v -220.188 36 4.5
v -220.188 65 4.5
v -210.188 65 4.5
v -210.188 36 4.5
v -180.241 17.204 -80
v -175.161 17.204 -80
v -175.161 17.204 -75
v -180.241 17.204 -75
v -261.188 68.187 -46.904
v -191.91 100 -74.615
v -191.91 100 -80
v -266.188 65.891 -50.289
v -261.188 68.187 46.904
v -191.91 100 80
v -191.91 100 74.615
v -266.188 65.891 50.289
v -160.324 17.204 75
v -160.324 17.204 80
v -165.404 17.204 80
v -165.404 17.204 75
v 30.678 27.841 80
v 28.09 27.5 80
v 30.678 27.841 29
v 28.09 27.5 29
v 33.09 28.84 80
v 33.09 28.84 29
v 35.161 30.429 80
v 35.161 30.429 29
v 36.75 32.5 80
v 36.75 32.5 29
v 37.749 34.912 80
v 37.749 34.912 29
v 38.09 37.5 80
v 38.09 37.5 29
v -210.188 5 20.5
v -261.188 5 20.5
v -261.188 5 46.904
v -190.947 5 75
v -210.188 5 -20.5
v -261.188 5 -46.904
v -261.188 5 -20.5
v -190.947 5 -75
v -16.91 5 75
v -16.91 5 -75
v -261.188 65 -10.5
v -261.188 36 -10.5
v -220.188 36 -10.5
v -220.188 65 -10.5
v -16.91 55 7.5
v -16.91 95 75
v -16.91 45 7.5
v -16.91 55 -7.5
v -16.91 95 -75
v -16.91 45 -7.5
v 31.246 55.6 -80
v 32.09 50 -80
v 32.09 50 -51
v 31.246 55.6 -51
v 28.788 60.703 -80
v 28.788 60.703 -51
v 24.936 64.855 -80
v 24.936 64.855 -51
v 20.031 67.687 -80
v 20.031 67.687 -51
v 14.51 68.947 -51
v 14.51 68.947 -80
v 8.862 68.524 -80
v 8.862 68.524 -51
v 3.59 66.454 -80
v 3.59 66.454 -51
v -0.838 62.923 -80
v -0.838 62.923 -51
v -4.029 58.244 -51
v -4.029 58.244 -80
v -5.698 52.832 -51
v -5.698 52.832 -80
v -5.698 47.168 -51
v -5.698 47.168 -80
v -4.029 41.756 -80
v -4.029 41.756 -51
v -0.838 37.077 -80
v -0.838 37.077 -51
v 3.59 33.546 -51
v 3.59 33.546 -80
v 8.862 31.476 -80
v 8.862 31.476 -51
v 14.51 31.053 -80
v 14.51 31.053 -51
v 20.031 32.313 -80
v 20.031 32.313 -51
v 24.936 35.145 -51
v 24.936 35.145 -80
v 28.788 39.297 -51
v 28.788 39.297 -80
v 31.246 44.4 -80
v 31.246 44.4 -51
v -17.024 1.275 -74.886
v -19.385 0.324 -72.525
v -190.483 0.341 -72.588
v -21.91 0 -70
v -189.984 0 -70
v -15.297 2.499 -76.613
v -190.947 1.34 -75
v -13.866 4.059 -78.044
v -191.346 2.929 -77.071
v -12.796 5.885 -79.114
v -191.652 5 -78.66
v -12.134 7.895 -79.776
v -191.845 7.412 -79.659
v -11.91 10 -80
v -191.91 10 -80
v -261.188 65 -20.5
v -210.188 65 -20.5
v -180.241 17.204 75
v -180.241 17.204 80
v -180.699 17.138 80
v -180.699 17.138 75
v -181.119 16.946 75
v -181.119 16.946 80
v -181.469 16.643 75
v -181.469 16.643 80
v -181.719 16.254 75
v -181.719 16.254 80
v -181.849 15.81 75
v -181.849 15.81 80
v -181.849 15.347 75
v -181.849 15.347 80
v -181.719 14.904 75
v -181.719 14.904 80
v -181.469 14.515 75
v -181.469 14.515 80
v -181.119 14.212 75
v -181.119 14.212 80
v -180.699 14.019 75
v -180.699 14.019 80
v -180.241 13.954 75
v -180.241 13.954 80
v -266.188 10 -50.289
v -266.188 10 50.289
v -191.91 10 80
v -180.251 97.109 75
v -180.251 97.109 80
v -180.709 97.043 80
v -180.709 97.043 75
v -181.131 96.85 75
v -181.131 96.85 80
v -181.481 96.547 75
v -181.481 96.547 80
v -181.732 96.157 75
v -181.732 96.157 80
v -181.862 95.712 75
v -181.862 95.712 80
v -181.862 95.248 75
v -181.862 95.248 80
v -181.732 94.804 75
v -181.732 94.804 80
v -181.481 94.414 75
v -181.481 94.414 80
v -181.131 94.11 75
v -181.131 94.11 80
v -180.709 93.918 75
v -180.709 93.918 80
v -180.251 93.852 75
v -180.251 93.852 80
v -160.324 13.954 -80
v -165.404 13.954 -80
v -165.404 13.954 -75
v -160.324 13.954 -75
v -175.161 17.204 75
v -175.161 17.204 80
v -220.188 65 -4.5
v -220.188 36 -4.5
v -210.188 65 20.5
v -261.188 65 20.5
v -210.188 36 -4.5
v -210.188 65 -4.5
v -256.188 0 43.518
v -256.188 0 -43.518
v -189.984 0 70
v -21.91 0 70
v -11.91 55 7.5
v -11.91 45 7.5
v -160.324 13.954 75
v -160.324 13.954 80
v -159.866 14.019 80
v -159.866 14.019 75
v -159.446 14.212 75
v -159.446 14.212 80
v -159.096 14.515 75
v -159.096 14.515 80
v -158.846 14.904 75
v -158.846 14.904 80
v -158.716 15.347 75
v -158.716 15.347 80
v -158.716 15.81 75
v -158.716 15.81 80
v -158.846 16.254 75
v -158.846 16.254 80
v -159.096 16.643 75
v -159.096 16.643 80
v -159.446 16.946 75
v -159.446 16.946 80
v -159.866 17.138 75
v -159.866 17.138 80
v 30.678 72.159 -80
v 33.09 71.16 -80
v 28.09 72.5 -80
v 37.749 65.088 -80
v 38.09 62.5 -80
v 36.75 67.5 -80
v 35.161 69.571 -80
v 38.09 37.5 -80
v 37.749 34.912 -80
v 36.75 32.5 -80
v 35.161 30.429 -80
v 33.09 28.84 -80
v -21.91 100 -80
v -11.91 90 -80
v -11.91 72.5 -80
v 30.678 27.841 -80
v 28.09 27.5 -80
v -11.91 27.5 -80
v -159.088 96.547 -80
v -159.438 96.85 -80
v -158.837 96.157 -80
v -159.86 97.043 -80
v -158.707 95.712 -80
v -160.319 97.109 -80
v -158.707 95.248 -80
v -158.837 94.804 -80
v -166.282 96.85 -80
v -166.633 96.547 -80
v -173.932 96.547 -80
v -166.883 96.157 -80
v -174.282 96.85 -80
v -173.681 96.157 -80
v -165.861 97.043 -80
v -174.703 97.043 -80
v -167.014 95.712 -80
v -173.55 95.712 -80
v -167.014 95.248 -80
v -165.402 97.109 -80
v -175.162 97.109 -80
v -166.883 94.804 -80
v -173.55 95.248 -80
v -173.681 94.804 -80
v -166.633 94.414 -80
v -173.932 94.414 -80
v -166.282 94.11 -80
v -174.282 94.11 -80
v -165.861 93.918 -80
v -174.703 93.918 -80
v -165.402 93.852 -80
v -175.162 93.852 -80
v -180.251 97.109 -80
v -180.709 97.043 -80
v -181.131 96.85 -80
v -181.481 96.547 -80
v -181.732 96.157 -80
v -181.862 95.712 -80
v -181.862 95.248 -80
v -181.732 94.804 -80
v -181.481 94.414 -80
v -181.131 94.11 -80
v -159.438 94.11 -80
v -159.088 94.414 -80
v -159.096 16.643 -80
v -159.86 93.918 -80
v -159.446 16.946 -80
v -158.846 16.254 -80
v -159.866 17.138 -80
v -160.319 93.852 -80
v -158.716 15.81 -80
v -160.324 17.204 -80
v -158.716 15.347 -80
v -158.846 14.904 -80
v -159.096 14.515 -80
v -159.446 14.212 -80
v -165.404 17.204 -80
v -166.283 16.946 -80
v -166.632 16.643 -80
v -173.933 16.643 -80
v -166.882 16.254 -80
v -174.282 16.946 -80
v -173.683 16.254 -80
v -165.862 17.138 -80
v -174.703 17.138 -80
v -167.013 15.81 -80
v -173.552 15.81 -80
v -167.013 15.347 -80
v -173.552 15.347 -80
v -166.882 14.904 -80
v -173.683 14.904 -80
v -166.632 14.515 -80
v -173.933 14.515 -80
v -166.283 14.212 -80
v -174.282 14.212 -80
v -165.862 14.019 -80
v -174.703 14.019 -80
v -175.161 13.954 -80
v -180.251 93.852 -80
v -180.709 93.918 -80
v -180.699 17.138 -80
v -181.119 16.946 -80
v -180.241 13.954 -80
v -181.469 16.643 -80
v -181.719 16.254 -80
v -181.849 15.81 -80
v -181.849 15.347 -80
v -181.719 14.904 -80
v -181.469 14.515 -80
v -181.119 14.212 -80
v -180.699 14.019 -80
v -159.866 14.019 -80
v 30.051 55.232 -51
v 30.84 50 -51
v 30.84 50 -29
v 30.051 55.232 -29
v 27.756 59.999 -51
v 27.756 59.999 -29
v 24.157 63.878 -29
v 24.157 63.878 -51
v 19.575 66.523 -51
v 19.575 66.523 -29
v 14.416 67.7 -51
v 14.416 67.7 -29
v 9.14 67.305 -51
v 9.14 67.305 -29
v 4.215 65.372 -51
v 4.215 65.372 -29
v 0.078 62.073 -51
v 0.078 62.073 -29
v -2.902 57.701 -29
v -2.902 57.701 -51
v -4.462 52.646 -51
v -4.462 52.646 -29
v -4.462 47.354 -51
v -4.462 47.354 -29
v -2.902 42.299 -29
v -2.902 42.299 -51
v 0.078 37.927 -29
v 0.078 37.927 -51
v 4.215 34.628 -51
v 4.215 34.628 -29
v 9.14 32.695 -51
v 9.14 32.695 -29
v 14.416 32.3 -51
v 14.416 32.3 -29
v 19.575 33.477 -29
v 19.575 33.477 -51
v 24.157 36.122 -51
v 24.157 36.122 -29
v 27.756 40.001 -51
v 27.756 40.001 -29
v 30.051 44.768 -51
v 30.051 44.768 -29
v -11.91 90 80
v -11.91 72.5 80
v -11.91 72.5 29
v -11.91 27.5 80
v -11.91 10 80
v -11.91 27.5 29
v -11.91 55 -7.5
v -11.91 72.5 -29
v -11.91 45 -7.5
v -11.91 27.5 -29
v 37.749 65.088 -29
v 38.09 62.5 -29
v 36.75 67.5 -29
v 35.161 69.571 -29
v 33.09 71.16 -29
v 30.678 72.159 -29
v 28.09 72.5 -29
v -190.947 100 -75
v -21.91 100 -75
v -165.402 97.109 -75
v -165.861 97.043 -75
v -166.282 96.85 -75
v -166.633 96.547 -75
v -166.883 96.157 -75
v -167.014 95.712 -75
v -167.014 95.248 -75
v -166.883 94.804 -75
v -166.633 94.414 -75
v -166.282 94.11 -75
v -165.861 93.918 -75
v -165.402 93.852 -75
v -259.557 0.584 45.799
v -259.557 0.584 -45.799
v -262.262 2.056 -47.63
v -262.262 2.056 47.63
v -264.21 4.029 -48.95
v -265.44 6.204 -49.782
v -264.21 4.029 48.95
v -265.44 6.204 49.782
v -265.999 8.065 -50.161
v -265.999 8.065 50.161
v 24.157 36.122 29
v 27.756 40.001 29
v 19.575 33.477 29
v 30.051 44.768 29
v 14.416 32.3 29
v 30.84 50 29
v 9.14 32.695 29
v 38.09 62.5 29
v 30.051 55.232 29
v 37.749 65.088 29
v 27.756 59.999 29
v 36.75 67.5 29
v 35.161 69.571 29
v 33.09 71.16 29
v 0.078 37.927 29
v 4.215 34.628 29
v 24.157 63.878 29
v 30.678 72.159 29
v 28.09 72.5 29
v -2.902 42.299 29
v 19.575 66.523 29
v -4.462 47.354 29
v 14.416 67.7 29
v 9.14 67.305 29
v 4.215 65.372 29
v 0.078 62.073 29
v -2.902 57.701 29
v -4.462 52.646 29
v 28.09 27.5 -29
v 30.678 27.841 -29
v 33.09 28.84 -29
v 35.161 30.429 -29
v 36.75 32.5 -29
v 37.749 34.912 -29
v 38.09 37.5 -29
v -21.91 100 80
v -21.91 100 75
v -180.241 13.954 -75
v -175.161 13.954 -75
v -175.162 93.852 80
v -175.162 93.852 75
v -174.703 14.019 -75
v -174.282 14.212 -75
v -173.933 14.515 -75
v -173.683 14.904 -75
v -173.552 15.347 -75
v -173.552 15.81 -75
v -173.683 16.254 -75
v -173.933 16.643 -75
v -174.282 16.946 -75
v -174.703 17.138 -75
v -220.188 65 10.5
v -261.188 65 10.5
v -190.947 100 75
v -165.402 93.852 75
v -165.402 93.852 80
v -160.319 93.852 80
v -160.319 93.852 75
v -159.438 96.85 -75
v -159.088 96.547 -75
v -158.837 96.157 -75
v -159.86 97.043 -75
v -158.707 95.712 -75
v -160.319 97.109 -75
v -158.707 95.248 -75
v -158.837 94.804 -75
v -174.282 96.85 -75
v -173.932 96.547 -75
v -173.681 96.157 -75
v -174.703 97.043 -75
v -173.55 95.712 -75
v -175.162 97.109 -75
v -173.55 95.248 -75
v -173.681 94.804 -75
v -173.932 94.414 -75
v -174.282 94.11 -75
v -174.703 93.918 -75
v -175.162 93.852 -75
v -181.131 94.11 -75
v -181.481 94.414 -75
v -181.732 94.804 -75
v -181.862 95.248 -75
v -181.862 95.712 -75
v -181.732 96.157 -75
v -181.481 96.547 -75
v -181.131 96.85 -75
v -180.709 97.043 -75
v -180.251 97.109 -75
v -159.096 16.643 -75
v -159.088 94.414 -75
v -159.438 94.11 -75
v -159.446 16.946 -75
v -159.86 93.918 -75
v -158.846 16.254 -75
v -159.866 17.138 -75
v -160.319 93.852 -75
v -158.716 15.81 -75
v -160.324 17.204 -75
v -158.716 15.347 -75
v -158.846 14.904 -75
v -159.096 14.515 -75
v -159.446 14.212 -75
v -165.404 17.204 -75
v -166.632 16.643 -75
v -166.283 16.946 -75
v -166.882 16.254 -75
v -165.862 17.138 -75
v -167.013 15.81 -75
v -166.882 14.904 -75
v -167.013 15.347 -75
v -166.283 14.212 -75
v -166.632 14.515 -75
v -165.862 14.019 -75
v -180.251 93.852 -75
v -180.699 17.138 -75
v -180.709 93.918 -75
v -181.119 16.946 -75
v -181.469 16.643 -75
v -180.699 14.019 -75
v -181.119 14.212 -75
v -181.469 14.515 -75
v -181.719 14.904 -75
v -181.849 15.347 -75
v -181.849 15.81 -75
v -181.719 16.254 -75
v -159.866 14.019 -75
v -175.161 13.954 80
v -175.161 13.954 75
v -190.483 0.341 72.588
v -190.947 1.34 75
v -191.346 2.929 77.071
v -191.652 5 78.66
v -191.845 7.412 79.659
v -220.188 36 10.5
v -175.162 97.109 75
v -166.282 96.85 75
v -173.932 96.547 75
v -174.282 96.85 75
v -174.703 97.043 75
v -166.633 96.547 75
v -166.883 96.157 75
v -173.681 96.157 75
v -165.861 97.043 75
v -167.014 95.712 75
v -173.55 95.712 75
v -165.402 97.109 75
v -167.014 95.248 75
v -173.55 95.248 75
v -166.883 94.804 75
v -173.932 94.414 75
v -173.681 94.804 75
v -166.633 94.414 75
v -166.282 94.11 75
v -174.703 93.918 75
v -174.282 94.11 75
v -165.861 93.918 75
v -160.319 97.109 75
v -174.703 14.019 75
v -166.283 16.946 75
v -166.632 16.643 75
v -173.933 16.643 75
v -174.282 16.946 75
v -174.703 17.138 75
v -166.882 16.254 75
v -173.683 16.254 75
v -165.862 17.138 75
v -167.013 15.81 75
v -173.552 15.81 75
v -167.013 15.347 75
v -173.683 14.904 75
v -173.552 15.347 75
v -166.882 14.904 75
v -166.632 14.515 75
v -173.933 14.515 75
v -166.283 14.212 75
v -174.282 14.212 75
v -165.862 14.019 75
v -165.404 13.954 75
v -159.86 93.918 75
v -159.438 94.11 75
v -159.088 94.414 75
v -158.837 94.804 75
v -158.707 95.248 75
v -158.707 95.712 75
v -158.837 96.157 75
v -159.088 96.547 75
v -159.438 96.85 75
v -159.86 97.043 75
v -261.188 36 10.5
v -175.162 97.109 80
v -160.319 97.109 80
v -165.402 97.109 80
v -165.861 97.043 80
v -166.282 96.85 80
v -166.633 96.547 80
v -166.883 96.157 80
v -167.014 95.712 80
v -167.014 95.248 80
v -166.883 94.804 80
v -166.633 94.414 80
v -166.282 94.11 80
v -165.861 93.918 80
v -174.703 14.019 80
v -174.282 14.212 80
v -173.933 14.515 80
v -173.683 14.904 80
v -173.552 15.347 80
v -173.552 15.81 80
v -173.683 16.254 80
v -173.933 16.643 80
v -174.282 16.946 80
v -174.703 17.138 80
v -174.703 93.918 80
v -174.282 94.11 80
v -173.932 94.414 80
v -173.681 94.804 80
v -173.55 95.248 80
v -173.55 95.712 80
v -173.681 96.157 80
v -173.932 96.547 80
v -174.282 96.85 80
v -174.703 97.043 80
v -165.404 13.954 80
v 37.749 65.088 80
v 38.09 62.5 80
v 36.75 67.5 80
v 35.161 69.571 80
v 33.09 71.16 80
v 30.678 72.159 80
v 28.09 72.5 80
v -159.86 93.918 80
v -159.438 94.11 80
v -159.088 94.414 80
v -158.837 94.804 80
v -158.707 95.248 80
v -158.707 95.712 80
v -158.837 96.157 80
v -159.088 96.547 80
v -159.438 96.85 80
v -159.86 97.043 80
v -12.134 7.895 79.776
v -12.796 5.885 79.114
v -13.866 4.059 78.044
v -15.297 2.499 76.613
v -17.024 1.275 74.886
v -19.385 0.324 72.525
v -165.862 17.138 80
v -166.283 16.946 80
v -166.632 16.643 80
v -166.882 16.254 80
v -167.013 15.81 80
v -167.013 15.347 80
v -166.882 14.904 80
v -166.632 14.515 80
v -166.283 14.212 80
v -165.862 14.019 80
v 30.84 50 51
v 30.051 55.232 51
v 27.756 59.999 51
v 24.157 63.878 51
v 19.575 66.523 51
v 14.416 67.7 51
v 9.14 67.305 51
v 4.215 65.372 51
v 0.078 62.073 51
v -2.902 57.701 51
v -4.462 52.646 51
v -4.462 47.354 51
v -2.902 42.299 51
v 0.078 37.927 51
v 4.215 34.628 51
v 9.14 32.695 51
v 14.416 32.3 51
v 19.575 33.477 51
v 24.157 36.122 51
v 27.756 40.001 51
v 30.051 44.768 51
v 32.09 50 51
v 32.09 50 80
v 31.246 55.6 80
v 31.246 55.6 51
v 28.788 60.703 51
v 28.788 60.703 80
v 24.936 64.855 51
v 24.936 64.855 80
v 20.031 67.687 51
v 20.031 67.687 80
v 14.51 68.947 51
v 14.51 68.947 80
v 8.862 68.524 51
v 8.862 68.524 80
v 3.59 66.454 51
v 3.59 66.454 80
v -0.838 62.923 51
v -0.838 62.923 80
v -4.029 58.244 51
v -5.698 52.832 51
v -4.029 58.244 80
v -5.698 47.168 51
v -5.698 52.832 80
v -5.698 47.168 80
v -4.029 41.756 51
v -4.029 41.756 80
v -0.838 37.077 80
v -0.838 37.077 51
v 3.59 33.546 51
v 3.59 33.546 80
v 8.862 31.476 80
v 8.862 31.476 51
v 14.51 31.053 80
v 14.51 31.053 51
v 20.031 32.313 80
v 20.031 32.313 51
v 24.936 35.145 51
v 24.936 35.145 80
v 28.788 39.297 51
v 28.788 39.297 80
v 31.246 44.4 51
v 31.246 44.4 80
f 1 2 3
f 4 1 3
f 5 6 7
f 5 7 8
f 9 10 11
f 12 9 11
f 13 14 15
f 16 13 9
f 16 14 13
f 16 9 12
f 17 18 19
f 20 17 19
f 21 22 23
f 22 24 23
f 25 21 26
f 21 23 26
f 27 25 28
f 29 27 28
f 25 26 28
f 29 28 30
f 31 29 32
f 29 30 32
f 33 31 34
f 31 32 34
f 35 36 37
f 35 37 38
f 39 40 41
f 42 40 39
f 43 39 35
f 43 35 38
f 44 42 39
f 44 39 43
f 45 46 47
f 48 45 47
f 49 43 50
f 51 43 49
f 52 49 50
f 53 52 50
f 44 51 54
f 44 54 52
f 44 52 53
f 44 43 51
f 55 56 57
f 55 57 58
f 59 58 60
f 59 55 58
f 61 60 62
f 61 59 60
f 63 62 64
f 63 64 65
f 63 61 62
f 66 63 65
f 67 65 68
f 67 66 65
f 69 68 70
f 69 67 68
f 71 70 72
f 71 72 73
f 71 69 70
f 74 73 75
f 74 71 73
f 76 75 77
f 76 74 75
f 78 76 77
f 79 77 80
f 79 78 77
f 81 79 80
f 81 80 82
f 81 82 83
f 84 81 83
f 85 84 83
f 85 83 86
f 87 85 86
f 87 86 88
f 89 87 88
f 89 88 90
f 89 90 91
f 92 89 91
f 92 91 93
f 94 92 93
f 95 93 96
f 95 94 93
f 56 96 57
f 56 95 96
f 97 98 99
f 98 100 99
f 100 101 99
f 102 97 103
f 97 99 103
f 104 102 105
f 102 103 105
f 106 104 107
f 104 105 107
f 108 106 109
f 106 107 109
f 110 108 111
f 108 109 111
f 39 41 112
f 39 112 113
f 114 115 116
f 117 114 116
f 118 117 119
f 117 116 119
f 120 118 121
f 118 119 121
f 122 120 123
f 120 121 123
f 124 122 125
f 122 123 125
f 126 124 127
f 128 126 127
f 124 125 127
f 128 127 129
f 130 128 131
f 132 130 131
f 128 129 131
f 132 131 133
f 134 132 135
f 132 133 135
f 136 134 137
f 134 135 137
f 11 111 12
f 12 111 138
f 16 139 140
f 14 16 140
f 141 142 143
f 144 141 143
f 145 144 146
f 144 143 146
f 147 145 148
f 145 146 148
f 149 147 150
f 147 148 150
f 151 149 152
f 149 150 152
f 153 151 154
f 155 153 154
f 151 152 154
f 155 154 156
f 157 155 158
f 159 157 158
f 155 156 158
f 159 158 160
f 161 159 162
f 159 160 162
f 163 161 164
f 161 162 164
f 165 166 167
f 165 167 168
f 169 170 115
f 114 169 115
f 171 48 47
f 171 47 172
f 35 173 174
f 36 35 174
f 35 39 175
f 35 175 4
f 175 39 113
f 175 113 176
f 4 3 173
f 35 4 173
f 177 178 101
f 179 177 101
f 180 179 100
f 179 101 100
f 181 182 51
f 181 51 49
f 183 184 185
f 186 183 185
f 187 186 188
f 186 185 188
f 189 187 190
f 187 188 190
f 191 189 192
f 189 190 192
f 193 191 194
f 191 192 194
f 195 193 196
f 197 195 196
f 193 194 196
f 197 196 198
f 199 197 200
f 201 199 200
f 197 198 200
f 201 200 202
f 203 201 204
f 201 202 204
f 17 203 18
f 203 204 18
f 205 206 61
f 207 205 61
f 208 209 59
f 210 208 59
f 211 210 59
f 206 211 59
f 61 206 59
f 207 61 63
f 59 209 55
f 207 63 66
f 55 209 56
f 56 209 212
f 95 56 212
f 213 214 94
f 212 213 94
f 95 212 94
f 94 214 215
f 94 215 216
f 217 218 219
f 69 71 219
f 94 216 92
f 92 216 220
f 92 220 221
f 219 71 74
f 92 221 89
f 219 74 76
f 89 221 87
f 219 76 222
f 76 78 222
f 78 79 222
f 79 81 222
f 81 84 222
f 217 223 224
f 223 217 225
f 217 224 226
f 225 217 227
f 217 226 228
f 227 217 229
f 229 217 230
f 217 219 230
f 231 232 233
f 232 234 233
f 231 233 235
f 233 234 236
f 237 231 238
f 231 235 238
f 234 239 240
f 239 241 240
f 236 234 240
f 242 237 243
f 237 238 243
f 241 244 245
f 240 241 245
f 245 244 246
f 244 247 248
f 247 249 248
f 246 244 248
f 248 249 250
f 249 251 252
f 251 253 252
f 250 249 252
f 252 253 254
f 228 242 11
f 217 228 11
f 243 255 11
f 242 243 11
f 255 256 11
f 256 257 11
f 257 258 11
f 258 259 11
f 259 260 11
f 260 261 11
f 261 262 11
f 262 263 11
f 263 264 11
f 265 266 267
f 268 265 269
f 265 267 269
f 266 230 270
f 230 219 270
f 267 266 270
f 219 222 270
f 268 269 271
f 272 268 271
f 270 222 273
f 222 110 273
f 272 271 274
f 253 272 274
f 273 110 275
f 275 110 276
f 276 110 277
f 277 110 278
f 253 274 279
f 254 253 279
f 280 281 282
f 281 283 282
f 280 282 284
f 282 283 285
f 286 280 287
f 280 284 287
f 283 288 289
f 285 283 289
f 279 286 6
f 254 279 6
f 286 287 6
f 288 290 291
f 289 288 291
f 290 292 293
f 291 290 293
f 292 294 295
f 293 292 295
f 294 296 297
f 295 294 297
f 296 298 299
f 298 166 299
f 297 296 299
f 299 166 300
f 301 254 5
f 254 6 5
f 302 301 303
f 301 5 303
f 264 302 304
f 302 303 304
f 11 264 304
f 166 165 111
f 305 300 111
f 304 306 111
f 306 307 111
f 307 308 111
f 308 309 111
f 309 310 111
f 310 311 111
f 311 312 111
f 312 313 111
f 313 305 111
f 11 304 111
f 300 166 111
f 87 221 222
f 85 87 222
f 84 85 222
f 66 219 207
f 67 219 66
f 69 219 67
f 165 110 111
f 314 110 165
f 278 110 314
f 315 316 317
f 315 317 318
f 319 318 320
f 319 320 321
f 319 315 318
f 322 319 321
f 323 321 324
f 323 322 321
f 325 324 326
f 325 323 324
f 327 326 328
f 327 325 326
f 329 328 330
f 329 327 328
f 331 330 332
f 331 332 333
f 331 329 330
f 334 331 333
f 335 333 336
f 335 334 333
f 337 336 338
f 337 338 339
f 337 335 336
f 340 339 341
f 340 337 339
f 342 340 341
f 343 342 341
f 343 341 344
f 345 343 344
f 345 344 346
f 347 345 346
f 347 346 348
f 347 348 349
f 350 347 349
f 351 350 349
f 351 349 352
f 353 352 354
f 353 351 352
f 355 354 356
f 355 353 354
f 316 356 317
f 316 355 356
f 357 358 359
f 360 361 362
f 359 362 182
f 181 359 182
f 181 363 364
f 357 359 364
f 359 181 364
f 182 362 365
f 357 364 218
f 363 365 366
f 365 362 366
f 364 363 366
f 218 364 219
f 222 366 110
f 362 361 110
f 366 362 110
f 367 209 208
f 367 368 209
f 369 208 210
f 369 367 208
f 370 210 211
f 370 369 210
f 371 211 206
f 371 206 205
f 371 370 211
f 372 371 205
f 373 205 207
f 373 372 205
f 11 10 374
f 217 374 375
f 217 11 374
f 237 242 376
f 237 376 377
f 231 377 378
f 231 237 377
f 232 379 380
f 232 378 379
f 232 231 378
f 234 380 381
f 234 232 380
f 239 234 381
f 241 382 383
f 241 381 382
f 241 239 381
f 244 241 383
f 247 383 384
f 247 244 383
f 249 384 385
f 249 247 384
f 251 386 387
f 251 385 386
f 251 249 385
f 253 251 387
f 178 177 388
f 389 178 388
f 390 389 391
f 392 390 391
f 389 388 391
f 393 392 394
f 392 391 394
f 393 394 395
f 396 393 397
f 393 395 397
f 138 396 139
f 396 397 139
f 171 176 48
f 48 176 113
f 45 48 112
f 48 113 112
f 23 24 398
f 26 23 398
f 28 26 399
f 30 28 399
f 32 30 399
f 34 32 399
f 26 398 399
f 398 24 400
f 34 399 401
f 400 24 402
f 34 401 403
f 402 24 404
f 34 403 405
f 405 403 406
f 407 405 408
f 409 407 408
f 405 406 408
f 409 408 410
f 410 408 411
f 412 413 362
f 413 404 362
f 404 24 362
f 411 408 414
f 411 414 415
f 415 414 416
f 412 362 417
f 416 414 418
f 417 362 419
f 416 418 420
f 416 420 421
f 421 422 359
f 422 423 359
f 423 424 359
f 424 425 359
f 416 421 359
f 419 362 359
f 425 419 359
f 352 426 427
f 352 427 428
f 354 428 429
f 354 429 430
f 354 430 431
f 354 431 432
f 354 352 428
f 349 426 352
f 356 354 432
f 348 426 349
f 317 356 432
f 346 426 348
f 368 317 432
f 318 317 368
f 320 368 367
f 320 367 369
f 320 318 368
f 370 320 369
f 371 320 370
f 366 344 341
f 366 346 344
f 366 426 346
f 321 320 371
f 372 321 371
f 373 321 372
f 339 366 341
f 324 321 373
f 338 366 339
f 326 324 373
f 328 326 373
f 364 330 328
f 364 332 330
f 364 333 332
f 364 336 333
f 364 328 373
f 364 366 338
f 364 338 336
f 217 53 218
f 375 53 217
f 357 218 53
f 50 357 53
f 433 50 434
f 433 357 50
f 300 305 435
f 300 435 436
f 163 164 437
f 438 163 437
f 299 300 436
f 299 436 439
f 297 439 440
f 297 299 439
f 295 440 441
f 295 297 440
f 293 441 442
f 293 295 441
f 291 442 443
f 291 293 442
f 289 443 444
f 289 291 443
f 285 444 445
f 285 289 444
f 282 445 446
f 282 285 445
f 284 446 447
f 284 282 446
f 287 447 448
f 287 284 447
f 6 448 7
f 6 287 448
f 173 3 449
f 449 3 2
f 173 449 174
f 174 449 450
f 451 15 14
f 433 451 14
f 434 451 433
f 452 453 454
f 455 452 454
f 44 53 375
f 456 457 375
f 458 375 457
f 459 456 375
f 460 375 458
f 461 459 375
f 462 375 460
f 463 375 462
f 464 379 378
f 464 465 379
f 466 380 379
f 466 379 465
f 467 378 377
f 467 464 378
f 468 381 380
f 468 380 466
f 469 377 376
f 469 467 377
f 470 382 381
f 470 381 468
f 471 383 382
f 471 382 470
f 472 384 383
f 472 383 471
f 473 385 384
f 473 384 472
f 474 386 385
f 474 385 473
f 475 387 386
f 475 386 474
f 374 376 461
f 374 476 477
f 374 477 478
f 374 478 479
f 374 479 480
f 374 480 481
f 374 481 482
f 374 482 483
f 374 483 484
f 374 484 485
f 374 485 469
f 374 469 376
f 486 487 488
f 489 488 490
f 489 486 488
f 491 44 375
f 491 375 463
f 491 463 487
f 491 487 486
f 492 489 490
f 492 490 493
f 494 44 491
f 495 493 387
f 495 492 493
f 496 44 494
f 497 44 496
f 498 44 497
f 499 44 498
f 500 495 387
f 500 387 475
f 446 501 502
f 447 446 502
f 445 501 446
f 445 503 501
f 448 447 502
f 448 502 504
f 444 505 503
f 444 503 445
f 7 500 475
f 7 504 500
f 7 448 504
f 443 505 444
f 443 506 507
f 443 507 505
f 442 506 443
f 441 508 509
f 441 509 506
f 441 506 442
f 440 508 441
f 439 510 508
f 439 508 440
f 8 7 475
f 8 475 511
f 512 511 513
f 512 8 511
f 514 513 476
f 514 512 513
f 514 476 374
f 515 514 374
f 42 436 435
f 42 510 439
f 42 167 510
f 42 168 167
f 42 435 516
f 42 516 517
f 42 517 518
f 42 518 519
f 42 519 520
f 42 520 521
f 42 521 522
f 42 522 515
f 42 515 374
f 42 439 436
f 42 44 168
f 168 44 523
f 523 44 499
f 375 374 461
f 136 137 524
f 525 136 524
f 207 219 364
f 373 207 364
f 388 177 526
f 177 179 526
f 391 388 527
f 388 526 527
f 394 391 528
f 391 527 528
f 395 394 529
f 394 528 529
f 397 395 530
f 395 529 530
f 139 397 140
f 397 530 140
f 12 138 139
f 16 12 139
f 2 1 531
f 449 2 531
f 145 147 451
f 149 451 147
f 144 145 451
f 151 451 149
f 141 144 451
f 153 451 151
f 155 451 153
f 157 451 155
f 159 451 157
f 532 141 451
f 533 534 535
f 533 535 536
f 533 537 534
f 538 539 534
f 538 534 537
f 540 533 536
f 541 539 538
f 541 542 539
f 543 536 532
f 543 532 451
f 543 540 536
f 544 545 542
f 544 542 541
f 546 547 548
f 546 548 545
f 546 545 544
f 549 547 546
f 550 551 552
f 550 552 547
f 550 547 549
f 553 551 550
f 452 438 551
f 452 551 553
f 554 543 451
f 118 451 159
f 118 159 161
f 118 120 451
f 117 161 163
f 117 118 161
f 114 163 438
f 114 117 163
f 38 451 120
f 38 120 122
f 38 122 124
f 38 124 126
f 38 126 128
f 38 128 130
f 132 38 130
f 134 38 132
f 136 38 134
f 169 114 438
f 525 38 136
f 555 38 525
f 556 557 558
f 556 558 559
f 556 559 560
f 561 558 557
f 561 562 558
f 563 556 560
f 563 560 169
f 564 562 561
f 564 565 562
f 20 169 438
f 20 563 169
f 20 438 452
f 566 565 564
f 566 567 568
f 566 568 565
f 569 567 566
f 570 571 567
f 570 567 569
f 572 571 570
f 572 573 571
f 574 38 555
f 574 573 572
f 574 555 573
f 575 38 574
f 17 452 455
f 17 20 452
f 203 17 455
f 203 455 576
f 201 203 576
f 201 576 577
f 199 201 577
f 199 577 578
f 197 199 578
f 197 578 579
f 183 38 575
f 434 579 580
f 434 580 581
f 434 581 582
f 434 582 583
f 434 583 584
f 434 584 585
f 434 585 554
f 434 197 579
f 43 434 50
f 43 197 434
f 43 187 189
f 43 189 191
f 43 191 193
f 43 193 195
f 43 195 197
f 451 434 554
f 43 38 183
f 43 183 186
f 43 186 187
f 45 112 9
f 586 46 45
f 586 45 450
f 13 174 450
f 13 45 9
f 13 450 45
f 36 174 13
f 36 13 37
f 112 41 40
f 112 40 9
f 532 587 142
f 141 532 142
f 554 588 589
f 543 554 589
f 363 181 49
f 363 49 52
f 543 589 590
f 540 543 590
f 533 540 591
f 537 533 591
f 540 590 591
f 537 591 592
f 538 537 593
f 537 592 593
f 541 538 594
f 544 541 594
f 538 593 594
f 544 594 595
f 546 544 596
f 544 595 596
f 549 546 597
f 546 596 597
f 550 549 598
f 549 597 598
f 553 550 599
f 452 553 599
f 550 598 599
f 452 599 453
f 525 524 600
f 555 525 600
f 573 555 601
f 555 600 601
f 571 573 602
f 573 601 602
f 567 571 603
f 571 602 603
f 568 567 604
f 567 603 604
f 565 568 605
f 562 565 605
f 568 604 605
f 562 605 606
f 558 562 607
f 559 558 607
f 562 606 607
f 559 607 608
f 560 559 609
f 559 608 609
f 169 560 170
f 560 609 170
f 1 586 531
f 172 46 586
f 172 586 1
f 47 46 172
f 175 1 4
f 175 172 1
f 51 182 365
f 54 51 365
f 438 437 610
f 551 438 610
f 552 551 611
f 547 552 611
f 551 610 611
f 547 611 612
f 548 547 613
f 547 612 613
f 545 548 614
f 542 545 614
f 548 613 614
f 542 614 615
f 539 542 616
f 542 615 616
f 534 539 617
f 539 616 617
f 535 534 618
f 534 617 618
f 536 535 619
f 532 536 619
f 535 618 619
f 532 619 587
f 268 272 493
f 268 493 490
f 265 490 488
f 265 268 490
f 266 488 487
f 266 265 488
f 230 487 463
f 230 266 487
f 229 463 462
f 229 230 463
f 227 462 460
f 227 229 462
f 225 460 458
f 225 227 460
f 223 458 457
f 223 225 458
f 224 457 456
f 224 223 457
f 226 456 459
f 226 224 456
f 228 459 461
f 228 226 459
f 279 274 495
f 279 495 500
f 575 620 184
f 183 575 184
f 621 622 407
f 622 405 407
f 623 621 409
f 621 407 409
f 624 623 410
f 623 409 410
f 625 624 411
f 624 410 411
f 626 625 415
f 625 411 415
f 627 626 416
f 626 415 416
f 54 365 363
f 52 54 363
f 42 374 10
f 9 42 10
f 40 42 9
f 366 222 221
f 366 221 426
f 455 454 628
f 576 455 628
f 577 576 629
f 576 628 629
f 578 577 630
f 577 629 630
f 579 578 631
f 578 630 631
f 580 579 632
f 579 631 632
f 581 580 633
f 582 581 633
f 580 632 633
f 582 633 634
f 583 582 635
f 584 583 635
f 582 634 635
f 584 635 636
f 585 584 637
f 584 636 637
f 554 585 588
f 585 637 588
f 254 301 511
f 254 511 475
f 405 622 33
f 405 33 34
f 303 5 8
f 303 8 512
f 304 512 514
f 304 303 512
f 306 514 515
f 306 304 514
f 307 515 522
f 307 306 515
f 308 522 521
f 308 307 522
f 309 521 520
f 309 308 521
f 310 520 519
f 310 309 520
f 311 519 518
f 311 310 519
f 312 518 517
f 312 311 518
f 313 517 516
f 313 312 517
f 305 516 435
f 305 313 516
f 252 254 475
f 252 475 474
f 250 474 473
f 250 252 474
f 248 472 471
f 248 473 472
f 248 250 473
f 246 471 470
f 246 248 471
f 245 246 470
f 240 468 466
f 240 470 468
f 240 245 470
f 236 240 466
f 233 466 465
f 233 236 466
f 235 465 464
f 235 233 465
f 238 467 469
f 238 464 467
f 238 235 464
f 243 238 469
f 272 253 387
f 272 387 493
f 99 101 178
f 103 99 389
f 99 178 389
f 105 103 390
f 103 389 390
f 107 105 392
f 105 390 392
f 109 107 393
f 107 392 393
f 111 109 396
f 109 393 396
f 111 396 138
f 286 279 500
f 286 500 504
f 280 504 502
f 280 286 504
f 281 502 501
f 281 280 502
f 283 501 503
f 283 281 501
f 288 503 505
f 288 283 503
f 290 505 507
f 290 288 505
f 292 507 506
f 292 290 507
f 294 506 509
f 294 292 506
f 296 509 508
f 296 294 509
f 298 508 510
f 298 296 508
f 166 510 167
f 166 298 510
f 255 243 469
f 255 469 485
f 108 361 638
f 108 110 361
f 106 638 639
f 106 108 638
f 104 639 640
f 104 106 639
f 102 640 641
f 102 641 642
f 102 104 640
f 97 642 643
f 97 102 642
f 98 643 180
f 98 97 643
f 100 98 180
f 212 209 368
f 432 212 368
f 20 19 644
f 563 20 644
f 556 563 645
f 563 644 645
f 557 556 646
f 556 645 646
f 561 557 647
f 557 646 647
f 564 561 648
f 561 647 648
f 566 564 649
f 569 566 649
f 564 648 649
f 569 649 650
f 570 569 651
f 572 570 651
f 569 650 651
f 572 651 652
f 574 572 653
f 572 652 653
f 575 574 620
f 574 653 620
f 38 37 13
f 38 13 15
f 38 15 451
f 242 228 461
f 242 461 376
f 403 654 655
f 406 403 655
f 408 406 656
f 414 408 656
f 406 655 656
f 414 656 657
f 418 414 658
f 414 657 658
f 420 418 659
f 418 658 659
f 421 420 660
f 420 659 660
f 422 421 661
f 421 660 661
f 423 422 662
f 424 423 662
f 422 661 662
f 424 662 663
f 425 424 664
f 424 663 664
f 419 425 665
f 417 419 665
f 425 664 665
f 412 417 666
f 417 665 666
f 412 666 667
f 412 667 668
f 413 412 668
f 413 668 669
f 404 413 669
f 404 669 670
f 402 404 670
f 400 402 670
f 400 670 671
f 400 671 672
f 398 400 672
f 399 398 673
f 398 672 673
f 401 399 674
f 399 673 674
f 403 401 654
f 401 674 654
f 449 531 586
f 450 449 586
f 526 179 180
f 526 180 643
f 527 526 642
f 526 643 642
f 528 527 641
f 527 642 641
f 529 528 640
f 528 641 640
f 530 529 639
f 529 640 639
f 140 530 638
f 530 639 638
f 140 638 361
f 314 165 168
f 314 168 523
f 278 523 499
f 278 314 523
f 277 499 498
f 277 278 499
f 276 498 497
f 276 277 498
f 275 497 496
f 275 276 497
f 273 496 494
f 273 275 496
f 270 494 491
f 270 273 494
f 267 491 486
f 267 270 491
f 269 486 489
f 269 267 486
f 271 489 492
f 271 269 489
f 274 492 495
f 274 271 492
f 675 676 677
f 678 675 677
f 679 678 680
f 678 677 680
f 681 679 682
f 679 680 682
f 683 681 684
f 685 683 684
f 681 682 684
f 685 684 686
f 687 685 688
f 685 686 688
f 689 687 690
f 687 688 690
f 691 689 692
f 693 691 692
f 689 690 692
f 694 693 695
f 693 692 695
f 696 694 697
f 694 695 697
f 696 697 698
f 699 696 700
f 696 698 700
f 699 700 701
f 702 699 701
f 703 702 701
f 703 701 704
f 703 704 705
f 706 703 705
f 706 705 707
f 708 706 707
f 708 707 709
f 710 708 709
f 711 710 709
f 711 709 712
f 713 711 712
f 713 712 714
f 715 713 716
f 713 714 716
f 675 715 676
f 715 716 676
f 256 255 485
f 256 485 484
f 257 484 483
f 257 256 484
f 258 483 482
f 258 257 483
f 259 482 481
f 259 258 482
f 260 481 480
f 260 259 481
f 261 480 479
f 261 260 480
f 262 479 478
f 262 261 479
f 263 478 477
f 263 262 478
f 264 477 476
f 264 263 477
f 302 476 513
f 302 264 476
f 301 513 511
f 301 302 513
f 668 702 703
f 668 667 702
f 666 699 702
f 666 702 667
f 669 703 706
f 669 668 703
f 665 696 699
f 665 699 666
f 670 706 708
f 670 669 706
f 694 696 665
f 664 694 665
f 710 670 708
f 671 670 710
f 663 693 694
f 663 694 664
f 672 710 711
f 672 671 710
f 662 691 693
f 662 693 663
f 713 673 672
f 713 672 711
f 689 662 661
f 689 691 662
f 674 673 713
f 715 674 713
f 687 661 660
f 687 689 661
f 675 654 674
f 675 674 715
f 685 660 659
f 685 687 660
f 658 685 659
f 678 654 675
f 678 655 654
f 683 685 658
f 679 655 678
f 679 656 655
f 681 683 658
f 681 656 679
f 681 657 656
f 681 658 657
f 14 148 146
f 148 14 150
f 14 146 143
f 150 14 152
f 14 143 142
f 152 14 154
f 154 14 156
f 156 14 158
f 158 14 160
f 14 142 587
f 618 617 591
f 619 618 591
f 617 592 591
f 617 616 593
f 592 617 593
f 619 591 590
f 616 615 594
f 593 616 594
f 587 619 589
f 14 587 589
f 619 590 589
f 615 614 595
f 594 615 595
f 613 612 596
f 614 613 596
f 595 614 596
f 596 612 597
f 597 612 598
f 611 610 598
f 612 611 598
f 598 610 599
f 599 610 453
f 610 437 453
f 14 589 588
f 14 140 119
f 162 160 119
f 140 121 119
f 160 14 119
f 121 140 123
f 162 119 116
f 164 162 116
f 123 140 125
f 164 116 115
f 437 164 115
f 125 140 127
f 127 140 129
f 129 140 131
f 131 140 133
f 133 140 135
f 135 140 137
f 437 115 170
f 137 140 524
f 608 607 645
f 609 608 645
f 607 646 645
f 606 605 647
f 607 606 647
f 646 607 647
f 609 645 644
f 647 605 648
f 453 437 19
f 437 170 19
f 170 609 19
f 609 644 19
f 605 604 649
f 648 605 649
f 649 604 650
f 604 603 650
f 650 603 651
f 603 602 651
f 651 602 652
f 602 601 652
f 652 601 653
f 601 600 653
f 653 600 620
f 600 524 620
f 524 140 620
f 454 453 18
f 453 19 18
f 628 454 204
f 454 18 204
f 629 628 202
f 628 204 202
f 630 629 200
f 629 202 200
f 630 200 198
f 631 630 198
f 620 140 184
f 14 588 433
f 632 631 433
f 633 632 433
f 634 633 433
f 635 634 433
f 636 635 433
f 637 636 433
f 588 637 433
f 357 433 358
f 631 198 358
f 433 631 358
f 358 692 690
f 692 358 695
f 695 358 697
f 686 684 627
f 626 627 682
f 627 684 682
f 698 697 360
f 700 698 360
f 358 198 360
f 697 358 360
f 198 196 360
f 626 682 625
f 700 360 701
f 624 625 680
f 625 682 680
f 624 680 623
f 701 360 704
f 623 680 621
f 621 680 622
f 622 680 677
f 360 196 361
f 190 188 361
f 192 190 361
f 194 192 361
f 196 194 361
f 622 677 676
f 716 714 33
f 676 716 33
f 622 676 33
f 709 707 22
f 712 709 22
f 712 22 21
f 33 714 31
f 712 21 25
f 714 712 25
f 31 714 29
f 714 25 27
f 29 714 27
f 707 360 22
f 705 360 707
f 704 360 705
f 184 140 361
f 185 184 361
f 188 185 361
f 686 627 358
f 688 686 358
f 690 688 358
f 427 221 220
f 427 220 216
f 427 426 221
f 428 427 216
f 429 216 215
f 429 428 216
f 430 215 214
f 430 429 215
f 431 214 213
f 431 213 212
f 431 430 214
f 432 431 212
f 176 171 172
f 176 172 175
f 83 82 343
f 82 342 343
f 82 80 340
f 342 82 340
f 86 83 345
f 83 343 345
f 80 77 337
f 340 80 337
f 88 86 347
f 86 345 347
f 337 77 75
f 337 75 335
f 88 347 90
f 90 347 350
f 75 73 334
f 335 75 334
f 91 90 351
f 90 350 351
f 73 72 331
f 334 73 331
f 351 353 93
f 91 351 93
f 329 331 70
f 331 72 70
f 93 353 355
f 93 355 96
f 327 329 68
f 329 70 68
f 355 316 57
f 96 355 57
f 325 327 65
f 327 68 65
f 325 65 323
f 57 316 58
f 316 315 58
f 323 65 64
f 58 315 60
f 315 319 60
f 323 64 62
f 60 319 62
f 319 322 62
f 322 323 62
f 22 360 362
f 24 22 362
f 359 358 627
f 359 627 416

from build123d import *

# Parameters (mm, degrees)
BOSS_EXTRUDE1_DEPTH = 100
SHELL1_T            = -5
CHAMFER1_SIZE       = 10
CHAMFER2_SIZE       = 10
FILLET2_R           = 10
CUT_EXTRUDE1_DEPTH  = 250
BOSS_EXTRUDE5_DEPTH = 60
SKETCH8_W           = 41
SKETCH8_H           = 21
BOSS_EXTRUDE6_DEPTH = 31
SKETCH12_W          = 51
SKETCH12_H          = 45
BOSS_EXTRUDE7_DEPTH = 50
SKETCH26_R          = 19
CUT_EXTRUDE2_DEPTH  = 29
SKETCH28_R          = 17.75
CUT_EXTRUDE3_DEPTH  = 22
BOSS_EXTRUDE8_DEPTH = 60
SKETCH30_W          = 10.5
SKETCH30_H          = 9
CUT_EXTRUDE4_DEPTH  = 29
FILLET4_R           = 10
SKETCH32_W          = 15
SKETCH32_H          = 10
CUT_EXTRUDE7_DEPTH  = 10
CUT_EXTRUDE8_DEPTH  = 10
SKETCH37_W          = 177.863308591
SKETCH37_H          = 31
CUT_EXTRUDE10_DEPTH = 84
FILLET11_R          = 10


with BuildPart() as part:
    # Sketch2 → Boss-Extrude1 (new body)
    with BuildSketch(Plane(origin=(0, 0, 0), x_dir=(1, 0, 0), z_dir=(0, 1, 0))):
        Polygon((-11.910210202, -80), (-11.910210202, 80), (-191.910210202, 80), (-266.188345473, 50.288745892), (-266.188345473, -50.288745892), (-191.910210202, -80), align=None)
    extrude(amount=BOSS_EXTRUDE1_DEPTH)

    # Shell1
    shell1_openings = [part.faces().sort_by_distance(p)[0] for p in [
        (-133.177254811, 100, 0),
    ]]
    offset(amount=SHELL1_T, openings=shell1_openings, kind=Kind.INTERSECTION)

    # Chamfer1
    # the kernel refuses this chamfer: 10 mm, written as the material it takes off along each edge
    with BuildSketch(Plane(origin=(-11.910210202, 100, 105.71682988), x_dir=(0.027495876610586317, -0.9996219169112968, 0), z_dir=(0, 0, -1))) as chamfer1_piece_1:
        Polygon((CHAMFER1_SIZE * 0.999621916911, CHAMFER1_SIZE * 0.0274958766106), (-CHAMFER1_SIZE * 0.0274958766106, CHAMFER1_SIZE * 0.999621916911), (0, 0), align=None)
    extrude(amount=211.433659759, mode=Mode.SUBTRACT)

    # Chamfer2
    # the kernel refuses this chamfer: 10 mm, written as the material it takes off along each edge
    with BuildSketch(Plane(origin=(-266.188345473, 100, -76.005575771), x_dir=(-0.0274958766105877, -0.9996219169112968, 0), z_dir=(0, 0, 1))) as chamfer2_piece_1:
        Polygon((CHAMFER2_SIZE * 0.999621916911, CHAMFER2_SIZE * 0.0274958766106), (-CHAMFER2_SIZE * 0.0274958766106, CHAMFER2_SIZE * 0.999621916911), (0, 0), align=None)
    extrude(amount=152.011151543, mode=Mode.SUBTRACT)

    # Fillet2
    fillet2_edges = [part.edges().sort_by_distance(p)[0] for p in [
        (-11.910210202, 0, 0),
        (-101.910210202, 0, 80),
        (-229.049277838, 0, 65.144372946),
        (-266.188345473, 0, 0),
        (-229.049277838, 0, -65.144372946),
        (-101.910210202, 0, -80),
    ]]
    fillet(fillet2_edges, radius=FILLET2_R)

    # Sketch3 → Cut-Extrude1 (cut)
    with BuildSketch(Plane.XY.offset(80)):
        Polygon((-191.910210202, 100), (-266.188345473, 65.891137916), (-266.188345473, 100), align=None)
    extrude(amount=-CUT_EXTRUDE1_DEPTH, mode=Mode.SUBTRACT)

    # Sketch4 → Boss-Extrude5 (add)
    with BuildSketch(Plane(origin=(0, 5, 0), x_dir=(1, 0, 0), z_dir=(0, 1, 0))):
        Polygon((-215.188345473, -15.5), (-444.051654064, -15.5), (-444.051654064, 15.5), (-261.610116413, 15.5), (-215.188345473, 15.5), align=None)
        Polygon((-261.188345473, 10.5), (-220.188345473, 10.5), (-220.188345473, -10.5), (-384.777774205, -10.5), (-384.777774205, 9.502386243), align=None, mode=Mode.SUBTRACT)
    extrude(amount=BOSS_EXTRUDE5_DEPTH)

    # Sketch8 → Boss-Extrude6 (add)
    with BuildSketch(Plane(origin=(0, 5, 0), x_dir=(1, 0, 0), z_dir=(0, 1, 0))):
        with Locations((-240.688345473, 0)):
            Rectangle(SKETCH8_W, SKETCH8_H)
    extrude(amount=BOSS_EXTRUDE6_DEPTH)

    # Sketch12 → Boss-Extrude7 (add)
    with BuildSketch(Plane(origin=(-11.910210202, 0, 0), x_dir=(0, 0, -1), z_dir=(1, 0, 0))):
        with Locations((-54.5, 50)):
            Rectangle(SKETCH12_W, SKETCH12_H)
    boss_extrude7 = extrude(amount=BOSS_EXTRUDE7_DEPTH)

    # Sketch26 → Cut-Extrude2 (cut)
    with BuildSketch(Plane.XY.offset(80)):
        with Locations((13.089789798, 50)):
            Circle(SKETCH26_R)
    cut_extrude2 = extrude(amount=-CUT_EXTRUDE2_DEPTH, mode=Mode.SUBTRACT)

    # Sketch28 → Cut-Extrude3 (cut)
    with BuildSketch(Plane.XY.offset(51)):
        with Locations((13.089789798, 50)):
            Circle(SKETCH28_R)
    cut_extrude3 = extrude(amount=-CUT_EXTRUDE3_DEPTH, mode=Mode.SUBTRACT)

    # Mirror1: Boss-Extrude7, Cut-Extrude2, Cut-Extrude3 across plane
    add(boss_extrude7.mirror(Plane.XY))
    add(cut_extrude2.mirror(Plane.XY), mode=Mode.SUBTRACT)
    add(cut_extrude3.mirror(Plane.XY), mode=Mode.SUBTRACT)

    # Sketch29 → Boss-Extrude8 (add)
    with BuildSketch(Plane(origin=(0, 65, 0), x_dir=(1, 0, 0), z_dir=(0, 1, 0))):
        Polygon((-261.188345473, 20.5), (-210.188345473, 20.5), (-210.188345473, -20.5), (-261.188345473, -20.5), (-261.188345473, -15.5), (-215.188345473, -15.5), (-215.188345473, 15.5), (-261.188345473, 15.5), align=None)
    extrude(amount=-BOSS_EXTRUDE8_DEPTH)

    # Sketch30 → Cut-Extrude4 (cut)
    with BuildSketch(Plane(origin=(0, 65, 0), x_dir=(1, 0, 0), z_dir=(0, 1, 0))):
        with Locations((-215.438345473, 0)):
            Rectangle(SKETCH30_W, SKETCH30_H)
    extrude(amount=-CUT_EXTRUDE4_DEPTH, mode=Mode.SUBTRACT)

    # Fillet4
    fillet4_edges = [part.edges().sort_by_distance(p)[0] for p in [
        (38.089789798, 72.5, 54.5),
        (38.089789798, 27.5, 54.5),
        (38.089789798, 27.5, -54.5),
        (38.089789798, 72.5, -54.5),
    ]]
    fillet(fillet4_edges, radius=FILLET4_R)

    # Sketch32 → Cut-Extrude7 (cut)
    with BuildSketch(Plane(origin=(-11.910210202, 0, 0), x_dir=(0, 0, -1), z_dir=(1, 0, 0))):
        with Locations((0, 50)):
            Rectangle(SKETCH32_W, SKETCH32_H)
    extrude(amount=-CUT_EXTRUDE7_DEPTH, mode=Mode.SUBTRACT)

    # Sketch34 → Cut-Extrude8 (cut)
    with BuildSketch(Plane(origin=(0, 0, -80), x_dir=(-1, 0, 0), z_dir=(0, 0, -1))):
        with BuildLine():
            Line((175.162205164, 97.108614193), (180.250510852, 97.108614193))
            ThreePointArc((180.250510852, 97.108614193), (181.878966661, 95.480158384), (180.250510852, 93.851702575))
            Line((180.250510852, 93.851702575), (175.162205164, 93.851702575))
            ThreePointArc((175.162205164, 93.851702575), (173.533749356, 95.480158384), (175.162205164, 97.108614193))
        make_face()
        with BuildLine():
            Line((160.318525442, 97.108614193), (165.401872055, 97.108614193))
            ThreePointArc((165.401872055, 97.108614193), (167.030327863, 95.480158384), (165.401872055, 93.851702575))
            Line((165.401872055, 93.851702575), (160.318525442, 93.851702575))
            ThreePointArc((160.318525442, 93.851702575), (158.690069633, 95.480158384), (160.318525442, 97.108614193))
        make_face()
        with BuildLine():
            Line((175.160903312, 17.203664766), (180.240903312, 17.203664766))
            ThreePointArc((180.240903312, 17.203664766), (181.865903312, 15.578664766), (180.240903312, 13.953664766))
            Line((180.240903312, 13.953664766), (175.160903312, 13.953664766))
            ThreePointArc((175.160903312, 13.953664766), (173.535903312, 15.578664766), (175.160903312, 17.203664766))
        make_face()
        with BuildLine():
            Line((160.324224815, 17.203664766), (165.404224815, 17.203664766))
            ThreePointArc((165.404224815, 17.203664766), (167.029224815, 15.578664766), (165.404224815, 13.953664766))
            Line((165.404224815, 13.953664766), (160.324224815, 13.953664766))
            ThreePointArc((160.324224815, 13.953664766), (158.699224815, 15.578664766), (160.324224815, 17.203664766))
        make_face()
    cut_extrude8 = extrude(amount=-CUT_EXTRUDE8_DEPTH, mode=Mode.SUBTRACT)

    # Mirror2: Cut-Extrude8 across plane
    add(cut_extrude8.mirror(Plane.XY), mode=Mode.SUBTRACT)

    # Sketch37 → Cut-Extrude10 (cut)
    with BuildSketch(Plane(origin=(0, 65, 0), x_dir=(1, 0, 0), z_dir=(0, 1, 0))):
        with Locations((-355.119999769, 0)):
            Rectangle(SKETCH37_W, SKETCH37_H)
    extrude(amount=-CUT_EXTRUDE10_DEPTH, mode=Mode.SUBTRACT)

    # Fillet11
    # the kernel refuses this fillet: 10 mm, written as the material it takes off along each edge
    with BuildSketch(Plane(origin=(-266.188345473, 5, 28), x_dir=(0, 1, 0), z_dir=(0, 0, -1))) as fillet11_piece_1:
        with BuildLine():
            CenterArc((5, 10), FILLET11_R, 240, 30)
            Line((0, 1.339745962), (-0.1, 1.166540881))
            ThreePointArc((-0.1, 1.166540881), (-0.2, 0.669872981), (-0.2, 0))
            Line((-0.2, 0), (0, -0.2))
            Line((0, -0.2), (5, -0.2))
            Line((5, -0.2), (5, 0))
        make_face()
    extrude(amount=30, mode=Mode.SUBTRACT)
    with BuildSketch(Plane(origin=(-266.188345473, 5, 2.040359995), x_dir=(0, 1, 0), z_dir=(0, 0, -1))) as fillet11_piece_2:
        with BuildLine():
            CenterArc((5, 10), FILLET11_R, 240, 30)
            Line((0, 1.339745962), (-0.1, 1.166540881))
            ThreePointArc((-0.1, 1.166540881), (-0.2, 0.669872981), (-0.2, 0))
            Line((-0.2, 0), (0, -0.2))
            Line((0, -0.2), (5, -0.2))
            Line((5, -0.2), (5, 0))
        make_face()
    extrude(amount=30.040359995, mode=Mode.SUBTRACT)


solid = part.part
